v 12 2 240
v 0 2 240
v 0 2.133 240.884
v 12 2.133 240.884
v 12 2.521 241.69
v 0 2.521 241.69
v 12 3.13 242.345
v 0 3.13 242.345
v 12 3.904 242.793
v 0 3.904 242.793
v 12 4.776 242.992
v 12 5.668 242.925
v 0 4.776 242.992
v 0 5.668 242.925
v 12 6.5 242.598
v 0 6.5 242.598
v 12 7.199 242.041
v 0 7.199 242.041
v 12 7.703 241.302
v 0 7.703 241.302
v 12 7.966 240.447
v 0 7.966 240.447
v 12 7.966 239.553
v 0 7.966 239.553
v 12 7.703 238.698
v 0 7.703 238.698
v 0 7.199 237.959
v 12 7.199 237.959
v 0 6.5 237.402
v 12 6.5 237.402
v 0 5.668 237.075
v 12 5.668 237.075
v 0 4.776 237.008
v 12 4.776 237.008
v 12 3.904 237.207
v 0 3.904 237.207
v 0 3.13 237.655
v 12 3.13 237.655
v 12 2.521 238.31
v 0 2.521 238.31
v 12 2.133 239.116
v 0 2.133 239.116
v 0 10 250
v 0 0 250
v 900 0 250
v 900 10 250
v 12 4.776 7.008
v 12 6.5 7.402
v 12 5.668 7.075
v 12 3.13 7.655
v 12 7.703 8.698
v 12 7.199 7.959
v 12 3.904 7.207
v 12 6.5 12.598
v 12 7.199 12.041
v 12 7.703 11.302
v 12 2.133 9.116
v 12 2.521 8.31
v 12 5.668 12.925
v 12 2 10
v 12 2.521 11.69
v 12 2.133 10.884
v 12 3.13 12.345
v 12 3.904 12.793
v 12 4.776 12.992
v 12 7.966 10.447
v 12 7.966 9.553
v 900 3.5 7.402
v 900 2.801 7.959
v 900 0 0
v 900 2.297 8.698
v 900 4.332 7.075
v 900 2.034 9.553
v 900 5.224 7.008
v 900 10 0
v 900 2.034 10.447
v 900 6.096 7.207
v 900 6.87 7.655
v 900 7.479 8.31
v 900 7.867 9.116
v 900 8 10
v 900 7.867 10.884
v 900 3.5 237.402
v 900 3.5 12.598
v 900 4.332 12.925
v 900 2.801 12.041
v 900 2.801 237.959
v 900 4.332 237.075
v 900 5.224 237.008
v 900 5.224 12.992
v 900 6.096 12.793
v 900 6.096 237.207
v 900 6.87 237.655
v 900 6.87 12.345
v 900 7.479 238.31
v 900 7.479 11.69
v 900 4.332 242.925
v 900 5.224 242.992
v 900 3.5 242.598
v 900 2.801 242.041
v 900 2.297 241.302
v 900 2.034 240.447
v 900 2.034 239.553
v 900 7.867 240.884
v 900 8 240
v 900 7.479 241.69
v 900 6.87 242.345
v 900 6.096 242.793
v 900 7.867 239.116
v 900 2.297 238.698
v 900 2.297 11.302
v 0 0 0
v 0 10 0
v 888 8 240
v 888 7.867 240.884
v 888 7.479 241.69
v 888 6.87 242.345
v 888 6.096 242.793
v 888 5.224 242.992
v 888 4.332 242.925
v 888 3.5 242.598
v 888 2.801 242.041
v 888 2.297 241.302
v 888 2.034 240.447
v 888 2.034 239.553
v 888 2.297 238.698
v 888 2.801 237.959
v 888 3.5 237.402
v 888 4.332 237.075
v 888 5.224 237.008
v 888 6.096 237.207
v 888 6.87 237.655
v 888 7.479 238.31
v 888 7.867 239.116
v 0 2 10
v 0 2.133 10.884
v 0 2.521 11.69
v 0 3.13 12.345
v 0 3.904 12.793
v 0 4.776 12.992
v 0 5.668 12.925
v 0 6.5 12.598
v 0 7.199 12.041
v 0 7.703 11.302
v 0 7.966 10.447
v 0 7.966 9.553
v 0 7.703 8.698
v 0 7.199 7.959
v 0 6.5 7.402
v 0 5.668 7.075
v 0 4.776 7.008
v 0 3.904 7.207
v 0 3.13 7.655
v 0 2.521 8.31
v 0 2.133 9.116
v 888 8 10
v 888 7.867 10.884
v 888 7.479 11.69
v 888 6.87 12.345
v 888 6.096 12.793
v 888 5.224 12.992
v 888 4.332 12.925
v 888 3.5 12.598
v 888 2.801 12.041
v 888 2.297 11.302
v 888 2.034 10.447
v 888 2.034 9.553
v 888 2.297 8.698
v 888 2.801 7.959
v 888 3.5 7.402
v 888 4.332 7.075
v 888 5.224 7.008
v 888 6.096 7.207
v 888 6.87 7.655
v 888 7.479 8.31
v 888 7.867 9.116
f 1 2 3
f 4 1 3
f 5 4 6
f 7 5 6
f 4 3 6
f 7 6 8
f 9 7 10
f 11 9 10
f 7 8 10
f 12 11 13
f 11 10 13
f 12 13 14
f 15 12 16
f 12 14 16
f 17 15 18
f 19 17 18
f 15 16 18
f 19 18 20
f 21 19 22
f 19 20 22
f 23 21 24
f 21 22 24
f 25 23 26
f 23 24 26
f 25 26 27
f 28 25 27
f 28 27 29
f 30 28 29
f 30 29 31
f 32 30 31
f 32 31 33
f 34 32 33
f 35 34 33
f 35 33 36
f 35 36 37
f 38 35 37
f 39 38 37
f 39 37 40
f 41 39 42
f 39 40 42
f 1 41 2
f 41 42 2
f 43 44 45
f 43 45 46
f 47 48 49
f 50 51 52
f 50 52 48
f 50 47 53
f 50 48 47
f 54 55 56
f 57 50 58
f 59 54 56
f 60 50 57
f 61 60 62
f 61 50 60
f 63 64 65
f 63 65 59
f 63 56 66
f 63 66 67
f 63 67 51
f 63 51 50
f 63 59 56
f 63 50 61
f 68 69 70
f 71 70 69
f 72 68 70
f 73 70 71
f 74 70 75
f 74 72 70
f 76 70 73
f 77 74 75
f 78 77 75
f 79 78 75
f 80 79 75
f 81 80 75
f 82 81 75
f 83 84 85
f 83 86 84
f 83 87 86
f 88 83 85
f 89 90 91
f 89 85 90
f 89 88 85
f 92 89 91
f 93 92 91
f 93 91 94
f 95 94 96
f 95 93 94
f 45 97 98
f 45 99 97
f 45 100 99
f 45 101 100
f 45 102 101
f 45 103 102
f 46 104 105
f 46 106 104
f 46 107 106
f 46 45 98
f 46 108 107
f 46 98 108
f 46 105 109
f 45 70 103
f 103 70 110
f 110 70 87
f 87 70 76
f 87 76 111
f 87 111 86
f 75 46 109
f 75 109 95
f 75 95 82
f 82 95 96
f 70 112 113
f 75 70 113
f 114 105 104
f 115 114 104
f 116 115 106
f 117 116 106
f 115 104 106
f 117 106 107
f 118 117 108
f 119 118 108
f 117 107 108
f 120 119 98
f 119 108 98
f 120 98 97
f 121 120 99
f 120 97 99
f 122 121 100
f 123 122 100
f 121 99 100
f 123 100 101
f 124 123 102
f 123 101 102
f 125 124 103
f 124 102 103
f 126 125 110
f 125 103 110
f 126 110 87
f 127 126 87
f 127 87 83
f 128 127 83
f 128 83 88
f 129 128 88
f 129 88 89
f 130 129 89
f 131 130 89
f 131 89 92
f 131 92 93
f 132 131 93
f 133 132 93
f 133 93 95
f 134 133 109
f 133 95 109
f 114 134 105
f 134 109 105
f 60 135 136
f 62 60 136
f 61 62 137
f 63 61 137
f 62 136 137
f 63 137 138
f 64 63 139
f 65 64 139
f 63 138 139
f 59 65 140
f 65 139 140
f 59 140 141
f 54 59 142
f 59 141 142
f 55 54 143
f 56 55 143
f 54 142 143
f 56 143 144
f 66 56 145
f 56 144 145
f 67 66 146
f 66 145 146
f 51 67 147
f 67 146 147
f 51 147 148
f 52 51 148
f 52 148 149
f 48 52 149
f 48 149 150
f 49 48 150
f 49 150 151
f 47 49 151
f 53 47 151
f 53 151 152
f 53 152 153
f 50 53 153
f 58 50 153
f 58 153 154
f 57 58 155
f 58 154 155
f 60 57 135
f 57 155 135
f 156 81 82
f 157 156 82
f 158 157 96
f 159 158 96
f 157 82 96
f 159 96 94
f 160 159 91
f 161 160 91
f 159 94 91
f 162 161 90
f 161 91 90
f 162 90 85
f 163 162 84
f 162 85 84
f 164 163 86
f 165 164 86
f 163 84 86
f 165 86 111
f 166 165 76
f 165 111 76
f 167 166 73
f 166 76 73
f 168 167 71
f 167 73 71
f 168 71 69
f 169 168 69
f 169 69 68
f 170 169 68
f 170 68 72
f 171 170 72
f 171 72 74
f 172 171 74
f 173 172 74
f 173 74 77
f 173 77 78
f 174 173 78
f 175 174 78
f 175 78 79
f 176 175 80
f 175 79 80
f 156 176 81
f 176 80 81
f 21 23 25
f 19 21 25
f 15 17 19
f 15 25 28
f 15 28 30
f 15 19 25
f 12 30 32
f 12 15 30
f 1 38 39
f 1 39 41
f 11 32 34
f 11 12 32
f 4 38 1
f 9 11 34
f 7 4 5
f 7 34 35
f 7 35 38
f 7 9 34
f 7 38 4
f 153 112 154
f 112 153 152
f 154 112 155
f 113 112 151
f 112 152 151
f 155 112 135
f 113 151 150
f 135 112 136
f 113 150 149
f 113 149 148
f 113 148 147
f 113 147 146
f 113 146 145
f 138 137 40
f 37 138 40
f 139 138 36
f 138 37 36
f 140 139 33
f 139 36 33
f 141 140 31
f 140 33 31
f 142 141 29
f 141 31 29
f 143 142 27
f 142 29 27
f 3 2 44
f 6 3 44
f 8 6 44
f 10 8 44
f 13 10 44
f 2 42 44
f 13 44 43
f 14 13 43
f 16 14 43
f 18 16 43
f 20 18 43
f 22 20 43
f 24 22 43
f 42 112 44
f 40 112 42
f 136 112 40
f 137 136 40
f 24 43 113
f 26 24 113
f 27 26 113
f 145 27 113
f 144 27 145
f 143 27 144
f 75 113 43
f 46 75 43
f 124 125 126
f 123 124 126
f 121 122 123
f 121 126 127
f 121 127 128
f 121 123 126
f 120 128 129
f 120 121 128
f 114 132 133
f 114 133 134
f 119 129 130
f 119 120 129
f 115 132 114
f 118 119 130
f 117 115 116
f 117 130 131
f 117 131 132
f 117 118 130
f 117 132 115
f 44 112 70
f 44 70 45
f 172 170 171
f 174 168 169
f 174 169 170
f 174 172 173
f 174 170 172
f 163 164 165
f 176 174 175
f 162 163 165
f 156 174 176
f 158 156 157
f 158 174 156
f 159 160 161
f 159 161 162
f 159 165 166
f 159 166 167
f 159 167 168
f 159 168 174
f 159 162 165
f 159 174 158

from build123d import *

# Parameters (mm, degrees)
F0_W     = 10
F0_H     = 250
F1_DEPTH = 900
F2_R     = 3
F3_DEPTH = 12
F4_R     = 3
F5_DEPTH = 12


with BuildPart() as f1:
    # F0 (on Right) → F1 (new body)
    with BuildSketch(Plane.YZ):
        with Locations((5, 125)):
            Rectangle(F0_W, F0_H)
    extrude(amount=F1_DEPTH)

    # F2 (on face) → F3 (cut)
    with BuildSketch(Plane.YZ.offset(900)):
        with Locations((5, 240)):
            Circle(F2_R)
        with Locations((5, 10)):
            Circle(F2_R)
    extrude(amount=-F3_DEPTH, mode=Mode.SUBTRACT)

    # F4 (on face) → F5 (cut)
    with BuildSketch(Plane(origin=(0, 0, 0), x_dir=(0, -1, 0), z_dir=(-1, 0, 0))):
        with Locations((-5, 240)):
            Circle(F4_R)
        with Locations((-5, 10)):
            Circle(F4_R)
    extrude(amount=-F5_DEPTH, mode=Mode.SUBTRACT)


solid = f1.part
